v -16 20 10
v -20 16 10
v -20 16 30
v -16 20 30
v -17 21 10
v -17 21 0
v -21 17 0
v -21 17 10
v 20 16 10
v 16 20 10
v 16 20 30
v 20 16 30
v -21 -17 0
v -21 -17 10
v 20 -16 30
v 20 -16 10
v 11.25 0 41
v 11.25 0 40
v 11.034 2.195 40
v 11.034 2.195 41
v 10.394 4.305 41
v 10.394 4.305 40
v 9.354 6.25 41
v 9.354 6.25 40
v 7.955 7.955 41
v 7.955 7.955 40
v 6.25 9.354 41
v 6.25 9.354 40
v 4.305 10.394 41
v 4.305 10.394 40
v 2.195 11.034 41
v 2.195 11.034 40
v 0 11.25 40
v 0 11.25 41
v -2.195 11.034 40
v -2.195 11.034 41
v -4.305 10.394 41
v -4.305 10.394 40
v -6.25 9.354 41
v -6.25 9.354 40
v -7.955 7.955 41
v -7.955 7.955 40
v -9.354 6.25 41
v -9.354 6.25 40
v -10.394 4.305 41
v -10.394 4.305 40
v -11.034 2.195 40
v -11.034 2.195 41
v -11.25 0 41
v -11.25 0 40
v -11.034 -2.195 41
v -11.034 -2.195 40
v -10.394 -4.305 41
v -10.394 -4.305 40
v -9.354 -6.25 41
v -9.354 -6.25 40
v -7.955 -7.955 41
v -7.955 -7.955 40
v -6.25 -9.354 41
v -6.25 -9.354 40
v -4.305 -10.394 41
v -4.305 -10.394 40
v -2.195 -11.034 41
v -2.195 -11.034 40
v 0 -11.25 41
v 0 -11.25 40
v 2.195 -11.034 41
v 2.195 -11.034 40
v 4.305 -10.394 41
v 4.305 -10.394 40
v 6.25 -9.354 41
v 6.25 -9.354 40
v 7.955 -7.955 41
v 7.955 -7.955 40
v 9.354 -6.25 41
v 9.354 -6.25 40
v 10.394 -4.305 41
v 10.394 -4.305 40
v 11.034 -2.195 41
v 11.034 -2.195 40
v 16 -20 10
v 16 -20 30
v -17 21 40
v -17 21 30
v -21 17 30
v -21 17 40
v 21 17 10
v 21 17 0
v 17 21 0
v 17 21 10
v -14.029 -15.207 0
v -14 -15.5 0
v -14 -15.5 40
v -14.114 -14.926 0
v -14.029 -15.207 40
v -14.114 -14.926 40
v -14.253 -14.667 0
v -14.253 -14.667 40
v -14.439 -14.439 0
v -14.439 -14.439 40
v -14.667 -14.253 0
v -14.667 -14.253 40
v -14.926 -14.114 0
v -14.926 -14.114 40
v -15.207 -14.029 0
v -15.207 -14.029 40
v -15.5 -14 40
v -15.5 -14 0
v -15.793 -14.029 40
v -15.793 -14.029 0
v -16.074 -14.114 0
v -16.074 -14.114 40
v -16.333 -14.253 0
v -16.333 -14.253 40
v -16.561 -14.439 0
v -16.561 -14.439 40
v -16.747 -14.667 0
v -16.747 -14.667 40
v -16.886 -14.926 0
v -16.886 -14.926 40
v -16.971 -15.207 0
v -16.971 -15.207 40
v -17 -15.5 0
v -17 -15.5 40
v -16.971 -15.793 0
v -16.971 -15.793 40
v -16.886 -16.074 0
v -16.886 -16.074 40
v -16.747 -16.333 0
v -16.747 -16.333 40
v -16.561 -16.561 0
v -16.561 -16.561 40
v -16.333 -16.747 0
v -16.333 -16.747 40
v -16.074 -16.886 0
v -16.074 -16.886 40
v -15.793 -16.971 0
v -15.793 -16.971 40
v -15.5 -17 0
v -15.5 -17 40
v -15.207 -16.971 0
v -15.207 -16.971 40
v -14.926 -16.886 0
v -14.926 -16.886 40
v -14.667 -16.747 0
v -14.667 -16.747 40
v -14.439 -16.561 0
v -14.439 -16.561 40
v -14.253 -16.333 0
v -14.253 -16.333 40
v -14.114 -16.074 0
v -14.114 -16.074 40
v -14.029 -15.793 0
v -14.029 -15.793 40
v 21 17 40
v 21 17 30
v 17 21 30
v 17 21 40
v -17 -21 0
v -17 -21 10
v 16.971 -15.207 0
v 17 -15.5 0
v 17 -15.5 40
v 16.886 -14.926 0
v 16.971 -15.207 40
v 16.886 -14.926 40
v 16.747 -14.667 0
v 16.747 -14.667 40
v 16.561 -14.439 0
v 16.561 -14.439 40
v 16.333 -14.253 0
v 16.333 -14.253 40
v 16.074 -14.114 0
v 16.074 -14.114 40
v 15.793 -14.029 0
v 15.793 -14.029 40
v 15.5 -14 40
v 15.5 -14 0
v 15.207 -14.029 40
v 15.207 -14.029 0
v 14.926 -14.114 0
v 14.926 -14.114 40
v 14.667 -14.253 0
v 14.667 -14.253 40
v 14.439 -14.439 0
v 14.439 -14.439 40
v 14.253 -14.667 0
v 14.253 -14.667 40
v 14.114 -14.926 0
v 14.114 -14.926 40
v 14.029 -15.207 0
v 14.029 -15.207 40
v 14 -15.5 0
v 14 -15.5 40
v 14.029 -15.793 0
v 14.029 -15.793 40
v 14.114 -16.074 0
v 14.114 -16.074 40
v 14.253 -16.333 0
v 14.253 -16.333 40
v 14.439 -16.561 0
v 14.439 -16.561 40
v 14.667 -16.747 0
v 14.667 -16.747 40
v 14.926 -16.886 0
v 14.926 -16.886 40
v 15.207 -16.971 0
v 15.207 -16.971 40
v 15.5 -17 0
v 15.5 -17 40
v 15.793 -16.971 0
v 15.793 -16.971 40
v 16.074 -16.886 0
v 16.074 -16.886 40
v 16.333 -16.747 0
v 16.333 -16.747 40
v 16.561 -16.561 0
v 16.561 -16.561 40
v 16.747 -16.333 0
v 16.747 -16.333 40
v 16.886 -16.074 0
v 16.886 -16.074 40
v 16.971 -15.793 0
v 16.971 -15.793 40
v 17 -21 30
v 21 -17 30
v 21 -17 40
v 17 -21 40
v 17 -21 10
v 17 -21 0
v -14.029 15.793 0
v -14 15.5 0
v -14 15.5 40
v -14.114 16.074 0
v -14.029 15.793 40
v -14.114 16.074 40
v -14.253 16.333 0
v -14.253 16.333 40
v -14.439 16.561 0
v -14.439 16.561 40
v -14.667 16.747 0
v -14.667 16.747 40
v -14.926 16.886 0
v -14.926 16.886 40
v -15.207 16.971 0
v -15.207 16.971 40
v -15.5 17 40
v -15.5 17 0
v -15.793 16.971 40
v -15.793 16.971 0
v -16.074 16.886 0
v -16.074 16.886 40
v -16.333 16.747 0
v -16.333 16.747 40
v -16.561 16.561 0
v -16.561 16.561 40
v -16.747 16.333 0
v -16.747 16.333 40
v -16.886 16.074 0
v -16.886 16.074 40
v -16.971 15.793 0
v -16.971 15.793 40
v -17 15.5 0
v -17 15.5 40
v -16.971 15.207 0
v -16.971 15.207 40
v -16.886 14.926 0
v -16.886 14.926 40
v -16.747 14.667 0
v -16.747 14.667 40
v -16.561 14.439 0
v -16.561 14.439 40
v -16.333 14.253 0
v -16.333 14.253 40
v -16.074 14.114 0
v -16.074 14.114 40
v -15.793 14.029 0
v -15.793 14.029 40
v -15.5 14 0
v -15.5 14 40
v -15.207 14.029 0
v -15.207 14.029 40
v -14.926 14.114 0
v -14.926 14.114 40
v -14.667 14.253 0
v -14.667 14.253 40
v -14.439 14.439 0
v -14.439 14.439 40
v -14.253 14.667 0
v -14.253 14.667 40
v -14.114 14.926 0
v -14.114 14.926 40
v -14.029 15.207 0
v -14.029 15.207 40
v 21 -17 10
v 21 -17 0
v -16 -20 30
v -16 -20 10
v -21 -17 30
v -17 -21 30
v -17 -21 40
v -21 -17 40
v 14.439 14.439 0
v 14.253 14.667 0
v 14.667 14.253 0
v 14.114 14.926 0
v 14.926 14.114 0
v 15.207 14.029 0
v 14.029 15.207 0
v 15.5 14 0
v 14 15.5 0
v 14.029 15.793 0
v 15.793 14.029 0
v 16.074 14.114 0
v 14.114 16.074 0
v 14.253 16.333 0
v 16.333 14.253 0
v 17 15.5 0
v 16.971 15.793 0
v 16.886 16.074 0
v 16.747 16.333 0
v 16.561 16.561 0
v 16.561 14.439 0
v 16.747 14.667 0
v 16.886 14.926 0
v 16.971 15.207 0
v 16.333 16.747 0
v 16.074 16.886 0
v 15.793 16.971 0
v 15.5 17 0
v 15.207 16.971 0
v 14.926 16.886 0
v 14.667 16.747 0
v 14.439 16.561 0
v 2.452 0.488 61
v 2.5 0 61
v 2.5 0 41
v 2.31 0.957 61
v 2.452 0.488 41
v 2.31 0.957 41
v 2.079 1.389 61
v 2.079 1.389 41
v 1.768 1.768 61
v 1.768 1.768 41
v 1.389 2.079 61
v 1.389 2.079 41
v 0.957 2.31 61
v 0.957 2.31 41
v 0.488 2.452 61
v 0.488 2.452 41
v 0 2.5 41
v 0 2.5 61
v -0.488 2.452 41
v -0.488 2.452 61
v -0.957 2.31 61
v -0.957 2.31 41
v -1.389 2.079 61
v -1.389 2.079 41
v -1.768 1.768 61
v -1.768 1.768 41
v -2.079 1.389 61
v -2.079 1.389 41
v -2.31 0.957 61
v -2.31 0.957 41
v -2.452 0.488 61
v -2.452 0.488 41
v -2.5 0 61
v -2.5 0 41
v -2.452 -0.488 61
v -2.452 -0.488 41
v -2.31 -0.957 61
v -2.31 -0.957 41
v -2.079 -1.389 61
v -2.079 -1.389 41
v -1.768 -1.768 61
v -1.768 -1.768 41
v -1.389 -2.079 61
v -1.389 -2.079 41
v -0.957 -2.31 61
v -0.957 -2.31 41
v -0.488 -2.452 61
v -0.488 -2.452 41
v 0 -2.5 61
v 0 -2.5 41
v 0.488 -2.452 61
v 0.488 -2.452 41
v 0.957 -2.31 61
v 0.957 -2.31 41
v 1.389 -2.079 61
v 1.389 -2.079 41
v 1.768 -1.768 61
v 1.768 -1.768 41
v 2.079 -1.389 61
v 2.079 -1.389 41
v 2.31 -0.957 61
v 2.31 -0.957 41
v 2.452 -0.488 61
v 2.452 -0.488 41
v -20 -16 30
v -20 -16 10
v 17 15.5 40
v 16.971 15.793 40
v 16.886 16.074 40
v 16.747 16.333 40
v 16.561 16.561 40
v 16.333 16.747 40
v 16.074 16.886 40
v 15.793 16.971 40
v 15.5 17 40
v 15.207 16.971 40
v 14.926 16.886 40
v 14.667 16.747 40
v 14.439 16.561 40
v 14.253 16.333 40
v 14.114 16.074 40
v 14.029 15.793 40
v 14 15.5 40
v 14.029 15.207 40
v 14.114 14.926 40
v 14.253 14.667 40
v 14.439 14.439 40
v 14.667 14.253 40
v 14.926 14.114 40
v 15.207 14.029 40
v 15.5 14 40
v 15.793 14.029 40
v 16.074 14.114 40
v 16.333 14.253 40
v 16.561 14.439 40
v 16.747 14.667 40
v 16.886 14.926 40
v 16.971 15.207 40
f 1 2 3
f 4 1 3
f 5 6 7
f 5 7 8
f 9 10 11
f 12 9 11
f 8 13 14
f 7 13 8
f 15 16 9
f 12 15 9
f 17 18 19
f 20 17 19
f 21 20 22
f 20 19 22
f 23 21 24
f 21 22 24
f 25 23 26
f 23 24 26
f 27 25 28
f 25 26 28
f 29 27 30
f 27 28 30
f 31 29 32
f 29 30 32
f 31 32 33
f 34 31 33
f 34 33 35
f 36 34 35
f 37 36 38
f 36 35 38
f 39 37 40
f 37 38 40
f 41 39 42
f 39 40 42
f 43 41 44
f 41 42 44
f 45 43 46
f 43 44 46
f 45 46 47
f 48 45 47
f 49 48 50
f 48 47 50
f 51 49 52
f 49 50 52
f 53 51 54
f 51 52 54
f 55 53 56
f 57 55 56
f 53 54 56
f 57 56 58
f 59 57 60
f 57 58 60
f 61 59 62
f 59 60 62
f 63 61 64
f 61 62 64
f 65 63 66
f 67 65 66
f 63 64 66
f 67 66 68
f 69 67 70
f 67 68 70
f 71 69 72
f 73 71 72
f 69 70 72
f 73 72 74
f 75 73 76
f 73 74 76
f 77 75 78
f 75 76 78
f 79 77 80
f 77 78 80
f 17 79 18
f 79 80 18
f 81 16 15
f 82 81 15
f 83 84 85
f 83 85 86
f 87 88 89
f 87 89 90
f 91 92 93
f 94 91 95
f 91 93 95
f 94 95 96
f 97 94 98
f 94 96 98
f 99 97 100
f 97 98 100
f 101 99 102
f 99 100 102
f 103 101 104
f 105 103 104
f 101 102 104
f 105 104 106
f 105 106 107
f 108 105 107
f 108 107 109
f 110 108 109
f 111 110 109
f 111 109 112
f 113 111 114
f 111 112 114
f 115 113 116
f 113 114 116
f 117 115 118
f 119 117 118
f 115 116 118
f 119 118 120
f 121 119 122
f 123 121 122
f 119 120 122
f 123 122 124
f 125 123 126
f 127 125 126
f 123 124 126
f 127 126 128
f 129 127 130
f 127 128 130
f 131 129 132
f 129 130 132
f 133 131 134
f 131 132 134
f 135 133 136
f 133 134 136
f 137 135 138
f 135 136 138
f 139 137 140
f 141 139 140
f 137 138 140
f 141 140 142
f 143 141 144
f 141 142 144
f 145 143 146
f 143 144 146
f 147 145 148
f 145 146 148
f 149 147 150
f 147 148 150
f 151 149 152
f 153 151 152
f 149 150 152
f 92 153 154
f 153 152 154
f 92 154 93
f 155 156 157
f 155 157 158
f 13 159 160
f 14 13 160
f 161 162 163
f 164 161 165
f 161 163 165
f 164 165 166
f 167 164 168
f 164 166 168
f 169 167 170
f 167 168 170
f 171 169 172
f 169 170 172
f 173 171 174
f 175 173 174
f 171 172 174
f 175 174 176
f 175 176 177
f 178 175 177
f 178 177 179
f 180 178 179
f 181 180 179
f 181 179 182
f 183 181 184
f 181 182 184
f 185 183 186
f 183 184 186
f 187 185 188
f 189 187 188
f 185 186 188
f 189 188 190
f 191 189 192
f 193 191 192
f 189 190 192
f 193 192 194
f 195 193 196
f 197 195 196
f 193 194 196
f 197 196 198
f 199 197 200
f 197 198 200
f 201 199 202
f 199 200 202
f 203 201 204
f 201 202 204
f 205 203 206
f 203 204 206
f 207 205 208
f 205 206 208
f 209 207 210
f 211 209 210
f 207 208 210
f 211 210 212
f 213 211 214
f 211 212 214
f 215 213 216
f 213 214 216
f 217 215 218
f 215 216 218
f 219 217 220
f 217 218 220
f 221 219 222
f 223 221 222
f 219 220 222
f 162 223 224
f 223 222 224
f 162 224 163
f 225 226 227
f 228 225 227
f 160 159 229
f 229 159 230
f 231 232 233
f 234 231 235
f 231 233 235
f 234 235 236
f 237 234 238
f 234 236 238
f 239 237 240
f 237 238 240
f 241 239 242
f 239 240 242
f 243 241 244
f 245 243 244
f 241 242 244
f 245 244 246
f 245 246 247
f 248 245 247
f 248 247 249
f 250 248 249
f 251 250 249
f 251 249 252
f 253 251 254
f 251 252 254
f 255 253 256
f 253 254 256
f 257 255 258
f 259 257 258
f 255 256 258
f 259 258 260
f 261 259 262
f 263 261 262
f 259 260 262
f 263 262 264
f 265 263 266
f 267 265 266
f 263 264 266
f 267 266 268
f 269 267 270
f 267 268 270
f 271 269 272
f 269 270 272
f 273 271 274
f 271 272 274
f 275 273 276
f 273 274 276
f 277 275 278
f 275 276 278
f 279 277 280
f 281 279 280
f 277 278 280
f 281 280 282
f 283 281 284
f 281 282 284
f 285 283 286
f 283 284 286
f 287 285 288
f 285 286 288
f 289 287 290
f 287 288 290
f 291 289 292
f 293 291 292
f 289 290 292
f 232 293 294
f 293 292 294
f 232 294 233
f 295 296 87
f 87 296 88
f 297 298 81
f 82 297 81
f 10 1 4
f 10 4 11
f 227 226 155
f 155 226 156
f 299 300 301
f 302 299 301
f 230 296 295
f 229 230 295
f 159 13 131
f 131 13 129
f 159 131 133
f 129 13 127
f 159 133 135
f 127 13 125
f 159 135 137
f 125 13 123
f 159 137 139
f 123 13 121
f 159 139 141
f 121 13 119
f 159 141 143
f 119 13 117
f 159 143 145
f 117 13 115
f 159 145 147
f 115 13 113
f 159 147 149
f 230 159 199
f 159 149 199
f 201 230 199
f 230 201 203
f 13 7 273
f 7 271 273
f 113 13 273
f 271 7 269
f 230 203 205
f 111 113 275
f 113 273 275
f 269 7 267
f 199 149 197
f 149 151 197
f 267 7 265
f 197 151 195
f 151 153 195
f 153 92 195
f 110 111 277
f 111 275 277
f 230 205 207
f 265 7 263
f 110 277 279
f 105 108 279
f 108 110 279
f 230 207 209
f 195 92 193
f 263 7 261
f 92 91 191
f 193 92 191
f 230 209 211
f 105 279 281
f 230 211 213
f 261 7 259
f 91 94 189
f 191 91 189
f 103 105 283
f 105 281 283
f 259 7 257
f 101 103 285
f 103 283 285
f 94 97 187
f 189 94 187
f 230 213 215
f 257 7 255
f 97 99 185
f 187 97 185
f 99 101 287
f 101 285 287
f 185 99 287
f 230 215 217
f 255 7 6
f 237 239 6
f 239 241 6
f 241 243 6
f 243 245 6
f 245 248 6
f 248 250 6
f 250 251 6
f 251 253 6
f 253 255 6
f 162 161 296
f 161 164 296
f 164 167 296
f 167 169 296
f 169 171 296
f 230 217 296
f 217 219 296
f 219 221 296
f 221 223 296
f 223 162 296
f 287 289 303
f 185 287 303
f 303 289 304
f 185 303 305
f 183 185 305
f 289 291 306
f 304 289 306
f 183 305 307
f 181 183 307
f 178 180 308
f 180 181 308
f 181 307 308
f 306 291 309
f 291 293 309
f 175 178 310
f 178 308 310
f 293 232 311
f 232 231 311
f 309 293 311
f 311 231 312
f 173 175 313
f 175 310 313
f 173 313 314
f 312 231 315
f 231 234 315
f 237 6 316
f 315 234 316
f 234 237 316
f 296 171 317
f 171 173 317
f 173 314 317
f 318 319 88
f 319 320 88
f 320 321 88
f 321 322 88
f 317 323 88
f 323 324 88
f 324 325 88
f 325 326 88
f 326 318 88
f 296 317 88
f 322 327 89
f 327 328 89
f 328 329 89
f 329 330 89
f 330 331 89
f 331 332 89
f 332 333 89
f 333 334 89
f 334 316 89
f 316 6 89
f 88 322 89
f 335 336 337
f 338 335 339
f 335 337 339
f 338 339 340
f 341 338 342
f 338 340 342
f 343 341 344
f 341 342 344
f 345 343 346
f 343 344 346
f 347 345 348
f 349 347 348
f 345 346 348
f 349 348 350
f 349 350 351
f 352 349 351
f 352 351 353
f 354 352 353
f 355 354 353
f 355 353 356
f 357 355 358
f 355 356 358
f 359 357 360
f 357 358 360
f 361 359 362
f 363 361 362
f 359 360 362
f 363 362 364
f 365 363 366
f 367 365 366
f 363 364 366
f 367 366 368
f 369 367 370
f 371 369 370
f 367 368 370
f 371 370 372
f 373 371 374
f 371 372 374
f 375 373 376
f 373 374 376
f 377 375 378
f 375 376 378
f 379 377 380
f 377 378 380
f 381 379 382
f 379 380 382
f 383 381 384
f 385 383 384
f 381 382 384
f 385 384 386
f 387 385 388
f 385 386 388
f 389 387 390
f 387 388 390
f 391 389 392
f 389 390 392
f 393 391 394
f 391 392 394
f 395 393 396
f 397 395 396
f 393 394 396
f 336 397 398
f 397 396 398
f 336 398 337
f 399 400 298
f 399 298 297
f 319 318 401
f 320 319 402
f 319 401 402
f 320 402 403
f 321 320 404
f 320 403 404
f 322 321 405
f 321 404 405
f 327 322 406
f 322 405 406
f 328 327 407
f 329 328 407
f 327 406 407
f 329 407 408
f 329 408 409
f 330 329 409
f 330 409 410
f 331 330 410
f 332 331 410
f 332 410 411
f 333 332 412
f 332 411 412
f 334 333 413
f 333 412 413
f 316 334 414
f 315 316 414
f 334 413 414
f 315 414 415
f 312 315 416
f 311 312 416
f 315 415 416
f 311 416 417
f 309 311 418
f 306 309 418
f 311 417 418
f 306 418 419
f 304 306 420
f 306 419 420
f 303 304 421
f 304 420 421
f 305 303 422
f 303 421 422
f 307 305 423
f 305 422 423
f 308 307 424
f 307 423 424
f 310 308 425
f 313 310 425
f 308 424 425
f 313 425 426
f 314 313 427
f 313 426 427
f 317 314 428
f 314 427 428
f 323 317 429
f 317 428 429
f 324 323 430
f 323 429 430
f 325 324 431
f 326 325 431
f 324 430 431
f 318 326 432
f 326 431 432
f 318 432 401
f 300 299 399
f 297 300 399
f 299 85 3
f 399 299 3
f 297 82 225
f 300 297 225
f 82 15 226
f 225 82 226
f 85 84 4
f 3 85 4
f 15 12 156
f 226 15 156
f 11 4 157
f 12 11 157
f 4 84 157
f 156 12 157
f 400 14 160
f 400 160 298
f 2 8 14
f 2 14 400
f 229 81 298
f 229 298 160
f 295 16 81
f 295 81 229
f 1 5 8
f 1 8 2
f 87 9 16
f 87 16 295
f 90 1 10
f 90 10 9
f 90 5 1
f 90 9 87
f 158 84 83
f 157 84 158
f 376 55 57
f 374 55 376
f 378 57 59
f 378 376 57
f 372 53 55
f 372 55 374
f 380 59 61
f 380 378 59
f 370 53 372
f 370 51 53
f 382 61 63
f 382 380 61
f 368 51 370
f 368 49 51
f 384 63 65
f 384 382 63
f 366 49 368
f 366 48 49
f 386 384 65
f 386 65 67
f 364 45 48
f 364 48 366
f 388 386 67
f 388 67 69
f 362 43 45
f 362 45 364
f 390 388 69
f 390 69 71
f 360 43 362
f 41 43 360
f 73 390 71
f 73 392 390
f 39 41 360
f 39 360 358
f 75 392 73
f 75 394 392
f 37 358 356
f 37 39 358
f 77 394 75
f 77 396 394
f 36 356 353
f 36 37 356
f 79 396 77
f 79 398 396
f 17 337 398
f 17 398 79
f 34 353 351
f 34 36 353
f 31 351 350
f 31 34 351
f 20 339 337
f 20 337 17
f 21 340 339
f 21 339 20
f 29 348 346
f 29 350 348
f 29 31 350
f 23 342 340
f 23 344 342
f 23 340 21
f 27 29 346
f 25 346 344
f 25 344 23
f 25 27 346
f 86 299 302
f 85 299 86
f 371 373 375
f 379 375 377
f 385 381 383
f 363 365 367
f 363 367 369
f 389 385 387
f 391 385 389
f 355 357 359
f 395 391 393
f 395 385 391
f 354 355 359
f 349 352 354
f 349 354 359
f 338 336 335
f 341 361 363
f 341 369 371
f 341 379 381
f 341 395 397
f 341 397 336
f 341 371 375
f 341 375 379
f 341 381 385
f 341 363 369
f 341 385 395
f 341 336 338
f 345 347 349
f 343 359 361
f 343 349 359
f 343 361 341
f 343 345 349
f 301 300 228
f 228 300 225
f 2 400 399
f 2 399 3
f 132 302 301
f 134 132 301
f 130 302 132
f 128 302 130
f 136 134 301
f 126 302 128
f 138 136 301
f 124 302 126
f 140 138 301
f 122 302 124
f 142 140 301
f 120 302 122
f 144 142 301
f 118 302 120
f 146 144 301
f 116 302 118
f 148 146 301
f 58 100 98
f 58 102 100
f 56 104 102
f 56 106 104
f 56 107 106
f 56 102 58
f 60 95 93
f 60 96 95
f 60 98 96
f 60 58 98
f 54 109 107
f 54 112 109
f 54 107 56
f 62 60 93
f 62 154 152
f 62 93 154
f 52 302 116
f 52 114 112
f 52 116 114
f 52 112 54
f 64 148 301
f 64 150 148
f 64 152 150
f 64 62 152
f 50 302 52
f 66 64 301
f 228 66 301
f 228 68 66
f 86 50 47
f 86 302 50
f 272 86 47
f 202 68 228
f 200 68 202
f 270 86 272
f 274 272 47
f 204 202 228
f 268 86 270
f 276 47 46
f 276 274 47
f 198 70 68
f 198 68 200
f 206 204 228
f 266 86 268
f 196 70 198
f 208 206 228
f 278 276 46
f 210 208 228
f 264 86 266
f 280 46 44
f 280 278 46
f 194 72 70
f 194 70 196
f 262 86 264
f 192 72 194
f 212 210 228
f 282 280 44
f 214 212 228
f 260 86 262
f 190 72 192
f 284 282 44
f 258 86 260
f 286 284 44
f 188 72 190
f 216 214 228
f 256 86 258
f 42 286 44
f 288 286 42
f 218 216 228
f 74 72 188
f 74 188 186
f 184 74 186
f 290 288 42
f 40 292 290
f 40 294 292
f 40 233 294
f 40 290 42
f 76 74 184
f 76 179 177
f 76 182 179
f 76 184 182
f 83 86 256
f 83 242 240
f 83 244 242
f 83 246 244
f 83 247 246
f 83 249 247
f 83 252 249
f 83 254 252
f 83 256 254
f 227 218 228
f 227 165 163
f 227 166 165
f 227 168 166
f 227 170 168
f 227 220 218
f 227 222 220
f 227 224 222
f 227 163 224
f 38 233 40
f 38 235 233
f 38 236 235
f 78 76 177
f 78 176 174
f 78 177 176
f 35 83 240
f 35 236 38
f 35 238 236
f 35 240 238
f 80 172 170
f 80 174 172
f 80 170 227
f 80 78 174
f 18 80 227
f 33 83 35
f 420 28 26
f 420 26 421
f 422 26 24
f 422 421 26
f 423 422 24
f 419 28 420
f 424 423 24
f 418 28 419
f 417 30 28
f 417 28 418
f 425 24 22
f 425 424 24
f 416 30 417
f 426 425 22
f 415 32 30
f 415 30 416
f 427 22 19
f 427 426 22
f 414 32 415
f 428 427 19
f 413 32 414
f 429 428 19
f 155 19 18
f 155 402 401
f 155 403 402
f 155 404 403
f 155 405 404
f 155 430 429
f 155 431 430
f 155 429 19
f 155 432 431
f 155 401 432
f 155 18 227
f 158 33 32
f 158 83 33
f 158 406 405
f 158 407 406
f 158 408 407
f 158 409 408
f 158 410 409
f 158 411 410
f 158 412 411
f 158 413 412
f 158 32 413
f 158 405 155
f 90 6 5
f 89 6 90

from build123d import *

# Parameters (mm, degrees)
SKETCH1_W           = 42
SKETCH1_H           = 42
BOSS_EXTRUDE1_DEPTH = 10
SKETCH2_W           = 40
SKETCH2_H           = 40
BOSS_EXTRUDE2_DEPTH = 20
SKETCH3_W           = 42
SKETCH3_H           = 42
BOSS_EXTRUDE3_DEPTH = 10
SKETCH4_R           = 11.25
BOSS_EXTRUDE4_DEPTH = 1
CHAMFER1_SIZE       = 4
SKETCH5_R           = 2.5
BOSS_EXTRUDE5_DEPTH = 20
SKETCH6_R           = 1.5
CUT_EXTRUDE1_DEPTH  = 40


with BuildPart() as part:
    # Sketch1 → Boss-Extrude1 (new body)
    with BuildSketch(Plane.XY):
        Rectangle(SKETCH1_W, SKETCH1_H)
    extrude(amount=BOSS_EXTRUDE1_DEPTH)

    # Sketch2 → Boss-Extrude2 (add)
    with BuildSketch(Plane.XY.offset(10)):
        Rectangle(SKETCH2_W, SKETCH2_H)
    extrude(amount=BOSS_EXTRUDE2_DEPTH)

    # Sketch3 → Boss-Extrude3 (add)
    with BuildSketch(Plane.XY.offset(30)):
        Rectangle(SKETCH3_W, SKETCH3_H)
    extrude(amount=BOSS_EXTRUDE3_DEPTH)

    # Sketch4 → Boss-Extrude4 (add)
    with BuildSketch(Plane.XY.offset(40)):
        Circle(SKETCH4_R)
    extrude(amount=BOSS_EXTRUDE4_DEPTH)

    # Chamfer1
    chamfer1_edges = [part.edges().sort_by_distance(p)[0] for p in [
        (20, -20, 20),
        (20, 20, 20),
        (-20, 20, 20),
        (-20, -20, 20),
        (21, -21, 35),
        (21, 21, 35),
        (-21, 21, 35),
        (-21, -21, 35),
        (21, -21, 5),
        (-21, -21, 5),
        (-21, 21, 5),
        (21, 21, 5),
    ]]
    chamfer(chamfer1_edges, length=CHAMFER1_SIZE)

    # Sketch5 → Boss-Extrude5 (add)
    with BuildSketch(Plane.XY.offset(41)):
        Circle(SKETCH5_R)
    extrude(amount=BOSS_EXTRUDE5_DEPTH)

    # Sketch6 → Cut-Extrude1 (cut)
    with BuildSketch(Plane.XY.offset(40)):
        with Locations((-15.5, -15.5)):
            Circle(SKETCH6_R)
        with Locations((-15.5, 15.5)):
            Circle(SKETCH6_R)
        with Locations((15.5, 15.5)):
            Circle(SKETCH6_R)
        with Locations((15.5, -15.5)):
            Circle(SKETCH6_R)
    extrude(amount=-CUT_EXTRUDE1_DEPTH, mode=Mode.SUBTRACT)


solid = part.part
